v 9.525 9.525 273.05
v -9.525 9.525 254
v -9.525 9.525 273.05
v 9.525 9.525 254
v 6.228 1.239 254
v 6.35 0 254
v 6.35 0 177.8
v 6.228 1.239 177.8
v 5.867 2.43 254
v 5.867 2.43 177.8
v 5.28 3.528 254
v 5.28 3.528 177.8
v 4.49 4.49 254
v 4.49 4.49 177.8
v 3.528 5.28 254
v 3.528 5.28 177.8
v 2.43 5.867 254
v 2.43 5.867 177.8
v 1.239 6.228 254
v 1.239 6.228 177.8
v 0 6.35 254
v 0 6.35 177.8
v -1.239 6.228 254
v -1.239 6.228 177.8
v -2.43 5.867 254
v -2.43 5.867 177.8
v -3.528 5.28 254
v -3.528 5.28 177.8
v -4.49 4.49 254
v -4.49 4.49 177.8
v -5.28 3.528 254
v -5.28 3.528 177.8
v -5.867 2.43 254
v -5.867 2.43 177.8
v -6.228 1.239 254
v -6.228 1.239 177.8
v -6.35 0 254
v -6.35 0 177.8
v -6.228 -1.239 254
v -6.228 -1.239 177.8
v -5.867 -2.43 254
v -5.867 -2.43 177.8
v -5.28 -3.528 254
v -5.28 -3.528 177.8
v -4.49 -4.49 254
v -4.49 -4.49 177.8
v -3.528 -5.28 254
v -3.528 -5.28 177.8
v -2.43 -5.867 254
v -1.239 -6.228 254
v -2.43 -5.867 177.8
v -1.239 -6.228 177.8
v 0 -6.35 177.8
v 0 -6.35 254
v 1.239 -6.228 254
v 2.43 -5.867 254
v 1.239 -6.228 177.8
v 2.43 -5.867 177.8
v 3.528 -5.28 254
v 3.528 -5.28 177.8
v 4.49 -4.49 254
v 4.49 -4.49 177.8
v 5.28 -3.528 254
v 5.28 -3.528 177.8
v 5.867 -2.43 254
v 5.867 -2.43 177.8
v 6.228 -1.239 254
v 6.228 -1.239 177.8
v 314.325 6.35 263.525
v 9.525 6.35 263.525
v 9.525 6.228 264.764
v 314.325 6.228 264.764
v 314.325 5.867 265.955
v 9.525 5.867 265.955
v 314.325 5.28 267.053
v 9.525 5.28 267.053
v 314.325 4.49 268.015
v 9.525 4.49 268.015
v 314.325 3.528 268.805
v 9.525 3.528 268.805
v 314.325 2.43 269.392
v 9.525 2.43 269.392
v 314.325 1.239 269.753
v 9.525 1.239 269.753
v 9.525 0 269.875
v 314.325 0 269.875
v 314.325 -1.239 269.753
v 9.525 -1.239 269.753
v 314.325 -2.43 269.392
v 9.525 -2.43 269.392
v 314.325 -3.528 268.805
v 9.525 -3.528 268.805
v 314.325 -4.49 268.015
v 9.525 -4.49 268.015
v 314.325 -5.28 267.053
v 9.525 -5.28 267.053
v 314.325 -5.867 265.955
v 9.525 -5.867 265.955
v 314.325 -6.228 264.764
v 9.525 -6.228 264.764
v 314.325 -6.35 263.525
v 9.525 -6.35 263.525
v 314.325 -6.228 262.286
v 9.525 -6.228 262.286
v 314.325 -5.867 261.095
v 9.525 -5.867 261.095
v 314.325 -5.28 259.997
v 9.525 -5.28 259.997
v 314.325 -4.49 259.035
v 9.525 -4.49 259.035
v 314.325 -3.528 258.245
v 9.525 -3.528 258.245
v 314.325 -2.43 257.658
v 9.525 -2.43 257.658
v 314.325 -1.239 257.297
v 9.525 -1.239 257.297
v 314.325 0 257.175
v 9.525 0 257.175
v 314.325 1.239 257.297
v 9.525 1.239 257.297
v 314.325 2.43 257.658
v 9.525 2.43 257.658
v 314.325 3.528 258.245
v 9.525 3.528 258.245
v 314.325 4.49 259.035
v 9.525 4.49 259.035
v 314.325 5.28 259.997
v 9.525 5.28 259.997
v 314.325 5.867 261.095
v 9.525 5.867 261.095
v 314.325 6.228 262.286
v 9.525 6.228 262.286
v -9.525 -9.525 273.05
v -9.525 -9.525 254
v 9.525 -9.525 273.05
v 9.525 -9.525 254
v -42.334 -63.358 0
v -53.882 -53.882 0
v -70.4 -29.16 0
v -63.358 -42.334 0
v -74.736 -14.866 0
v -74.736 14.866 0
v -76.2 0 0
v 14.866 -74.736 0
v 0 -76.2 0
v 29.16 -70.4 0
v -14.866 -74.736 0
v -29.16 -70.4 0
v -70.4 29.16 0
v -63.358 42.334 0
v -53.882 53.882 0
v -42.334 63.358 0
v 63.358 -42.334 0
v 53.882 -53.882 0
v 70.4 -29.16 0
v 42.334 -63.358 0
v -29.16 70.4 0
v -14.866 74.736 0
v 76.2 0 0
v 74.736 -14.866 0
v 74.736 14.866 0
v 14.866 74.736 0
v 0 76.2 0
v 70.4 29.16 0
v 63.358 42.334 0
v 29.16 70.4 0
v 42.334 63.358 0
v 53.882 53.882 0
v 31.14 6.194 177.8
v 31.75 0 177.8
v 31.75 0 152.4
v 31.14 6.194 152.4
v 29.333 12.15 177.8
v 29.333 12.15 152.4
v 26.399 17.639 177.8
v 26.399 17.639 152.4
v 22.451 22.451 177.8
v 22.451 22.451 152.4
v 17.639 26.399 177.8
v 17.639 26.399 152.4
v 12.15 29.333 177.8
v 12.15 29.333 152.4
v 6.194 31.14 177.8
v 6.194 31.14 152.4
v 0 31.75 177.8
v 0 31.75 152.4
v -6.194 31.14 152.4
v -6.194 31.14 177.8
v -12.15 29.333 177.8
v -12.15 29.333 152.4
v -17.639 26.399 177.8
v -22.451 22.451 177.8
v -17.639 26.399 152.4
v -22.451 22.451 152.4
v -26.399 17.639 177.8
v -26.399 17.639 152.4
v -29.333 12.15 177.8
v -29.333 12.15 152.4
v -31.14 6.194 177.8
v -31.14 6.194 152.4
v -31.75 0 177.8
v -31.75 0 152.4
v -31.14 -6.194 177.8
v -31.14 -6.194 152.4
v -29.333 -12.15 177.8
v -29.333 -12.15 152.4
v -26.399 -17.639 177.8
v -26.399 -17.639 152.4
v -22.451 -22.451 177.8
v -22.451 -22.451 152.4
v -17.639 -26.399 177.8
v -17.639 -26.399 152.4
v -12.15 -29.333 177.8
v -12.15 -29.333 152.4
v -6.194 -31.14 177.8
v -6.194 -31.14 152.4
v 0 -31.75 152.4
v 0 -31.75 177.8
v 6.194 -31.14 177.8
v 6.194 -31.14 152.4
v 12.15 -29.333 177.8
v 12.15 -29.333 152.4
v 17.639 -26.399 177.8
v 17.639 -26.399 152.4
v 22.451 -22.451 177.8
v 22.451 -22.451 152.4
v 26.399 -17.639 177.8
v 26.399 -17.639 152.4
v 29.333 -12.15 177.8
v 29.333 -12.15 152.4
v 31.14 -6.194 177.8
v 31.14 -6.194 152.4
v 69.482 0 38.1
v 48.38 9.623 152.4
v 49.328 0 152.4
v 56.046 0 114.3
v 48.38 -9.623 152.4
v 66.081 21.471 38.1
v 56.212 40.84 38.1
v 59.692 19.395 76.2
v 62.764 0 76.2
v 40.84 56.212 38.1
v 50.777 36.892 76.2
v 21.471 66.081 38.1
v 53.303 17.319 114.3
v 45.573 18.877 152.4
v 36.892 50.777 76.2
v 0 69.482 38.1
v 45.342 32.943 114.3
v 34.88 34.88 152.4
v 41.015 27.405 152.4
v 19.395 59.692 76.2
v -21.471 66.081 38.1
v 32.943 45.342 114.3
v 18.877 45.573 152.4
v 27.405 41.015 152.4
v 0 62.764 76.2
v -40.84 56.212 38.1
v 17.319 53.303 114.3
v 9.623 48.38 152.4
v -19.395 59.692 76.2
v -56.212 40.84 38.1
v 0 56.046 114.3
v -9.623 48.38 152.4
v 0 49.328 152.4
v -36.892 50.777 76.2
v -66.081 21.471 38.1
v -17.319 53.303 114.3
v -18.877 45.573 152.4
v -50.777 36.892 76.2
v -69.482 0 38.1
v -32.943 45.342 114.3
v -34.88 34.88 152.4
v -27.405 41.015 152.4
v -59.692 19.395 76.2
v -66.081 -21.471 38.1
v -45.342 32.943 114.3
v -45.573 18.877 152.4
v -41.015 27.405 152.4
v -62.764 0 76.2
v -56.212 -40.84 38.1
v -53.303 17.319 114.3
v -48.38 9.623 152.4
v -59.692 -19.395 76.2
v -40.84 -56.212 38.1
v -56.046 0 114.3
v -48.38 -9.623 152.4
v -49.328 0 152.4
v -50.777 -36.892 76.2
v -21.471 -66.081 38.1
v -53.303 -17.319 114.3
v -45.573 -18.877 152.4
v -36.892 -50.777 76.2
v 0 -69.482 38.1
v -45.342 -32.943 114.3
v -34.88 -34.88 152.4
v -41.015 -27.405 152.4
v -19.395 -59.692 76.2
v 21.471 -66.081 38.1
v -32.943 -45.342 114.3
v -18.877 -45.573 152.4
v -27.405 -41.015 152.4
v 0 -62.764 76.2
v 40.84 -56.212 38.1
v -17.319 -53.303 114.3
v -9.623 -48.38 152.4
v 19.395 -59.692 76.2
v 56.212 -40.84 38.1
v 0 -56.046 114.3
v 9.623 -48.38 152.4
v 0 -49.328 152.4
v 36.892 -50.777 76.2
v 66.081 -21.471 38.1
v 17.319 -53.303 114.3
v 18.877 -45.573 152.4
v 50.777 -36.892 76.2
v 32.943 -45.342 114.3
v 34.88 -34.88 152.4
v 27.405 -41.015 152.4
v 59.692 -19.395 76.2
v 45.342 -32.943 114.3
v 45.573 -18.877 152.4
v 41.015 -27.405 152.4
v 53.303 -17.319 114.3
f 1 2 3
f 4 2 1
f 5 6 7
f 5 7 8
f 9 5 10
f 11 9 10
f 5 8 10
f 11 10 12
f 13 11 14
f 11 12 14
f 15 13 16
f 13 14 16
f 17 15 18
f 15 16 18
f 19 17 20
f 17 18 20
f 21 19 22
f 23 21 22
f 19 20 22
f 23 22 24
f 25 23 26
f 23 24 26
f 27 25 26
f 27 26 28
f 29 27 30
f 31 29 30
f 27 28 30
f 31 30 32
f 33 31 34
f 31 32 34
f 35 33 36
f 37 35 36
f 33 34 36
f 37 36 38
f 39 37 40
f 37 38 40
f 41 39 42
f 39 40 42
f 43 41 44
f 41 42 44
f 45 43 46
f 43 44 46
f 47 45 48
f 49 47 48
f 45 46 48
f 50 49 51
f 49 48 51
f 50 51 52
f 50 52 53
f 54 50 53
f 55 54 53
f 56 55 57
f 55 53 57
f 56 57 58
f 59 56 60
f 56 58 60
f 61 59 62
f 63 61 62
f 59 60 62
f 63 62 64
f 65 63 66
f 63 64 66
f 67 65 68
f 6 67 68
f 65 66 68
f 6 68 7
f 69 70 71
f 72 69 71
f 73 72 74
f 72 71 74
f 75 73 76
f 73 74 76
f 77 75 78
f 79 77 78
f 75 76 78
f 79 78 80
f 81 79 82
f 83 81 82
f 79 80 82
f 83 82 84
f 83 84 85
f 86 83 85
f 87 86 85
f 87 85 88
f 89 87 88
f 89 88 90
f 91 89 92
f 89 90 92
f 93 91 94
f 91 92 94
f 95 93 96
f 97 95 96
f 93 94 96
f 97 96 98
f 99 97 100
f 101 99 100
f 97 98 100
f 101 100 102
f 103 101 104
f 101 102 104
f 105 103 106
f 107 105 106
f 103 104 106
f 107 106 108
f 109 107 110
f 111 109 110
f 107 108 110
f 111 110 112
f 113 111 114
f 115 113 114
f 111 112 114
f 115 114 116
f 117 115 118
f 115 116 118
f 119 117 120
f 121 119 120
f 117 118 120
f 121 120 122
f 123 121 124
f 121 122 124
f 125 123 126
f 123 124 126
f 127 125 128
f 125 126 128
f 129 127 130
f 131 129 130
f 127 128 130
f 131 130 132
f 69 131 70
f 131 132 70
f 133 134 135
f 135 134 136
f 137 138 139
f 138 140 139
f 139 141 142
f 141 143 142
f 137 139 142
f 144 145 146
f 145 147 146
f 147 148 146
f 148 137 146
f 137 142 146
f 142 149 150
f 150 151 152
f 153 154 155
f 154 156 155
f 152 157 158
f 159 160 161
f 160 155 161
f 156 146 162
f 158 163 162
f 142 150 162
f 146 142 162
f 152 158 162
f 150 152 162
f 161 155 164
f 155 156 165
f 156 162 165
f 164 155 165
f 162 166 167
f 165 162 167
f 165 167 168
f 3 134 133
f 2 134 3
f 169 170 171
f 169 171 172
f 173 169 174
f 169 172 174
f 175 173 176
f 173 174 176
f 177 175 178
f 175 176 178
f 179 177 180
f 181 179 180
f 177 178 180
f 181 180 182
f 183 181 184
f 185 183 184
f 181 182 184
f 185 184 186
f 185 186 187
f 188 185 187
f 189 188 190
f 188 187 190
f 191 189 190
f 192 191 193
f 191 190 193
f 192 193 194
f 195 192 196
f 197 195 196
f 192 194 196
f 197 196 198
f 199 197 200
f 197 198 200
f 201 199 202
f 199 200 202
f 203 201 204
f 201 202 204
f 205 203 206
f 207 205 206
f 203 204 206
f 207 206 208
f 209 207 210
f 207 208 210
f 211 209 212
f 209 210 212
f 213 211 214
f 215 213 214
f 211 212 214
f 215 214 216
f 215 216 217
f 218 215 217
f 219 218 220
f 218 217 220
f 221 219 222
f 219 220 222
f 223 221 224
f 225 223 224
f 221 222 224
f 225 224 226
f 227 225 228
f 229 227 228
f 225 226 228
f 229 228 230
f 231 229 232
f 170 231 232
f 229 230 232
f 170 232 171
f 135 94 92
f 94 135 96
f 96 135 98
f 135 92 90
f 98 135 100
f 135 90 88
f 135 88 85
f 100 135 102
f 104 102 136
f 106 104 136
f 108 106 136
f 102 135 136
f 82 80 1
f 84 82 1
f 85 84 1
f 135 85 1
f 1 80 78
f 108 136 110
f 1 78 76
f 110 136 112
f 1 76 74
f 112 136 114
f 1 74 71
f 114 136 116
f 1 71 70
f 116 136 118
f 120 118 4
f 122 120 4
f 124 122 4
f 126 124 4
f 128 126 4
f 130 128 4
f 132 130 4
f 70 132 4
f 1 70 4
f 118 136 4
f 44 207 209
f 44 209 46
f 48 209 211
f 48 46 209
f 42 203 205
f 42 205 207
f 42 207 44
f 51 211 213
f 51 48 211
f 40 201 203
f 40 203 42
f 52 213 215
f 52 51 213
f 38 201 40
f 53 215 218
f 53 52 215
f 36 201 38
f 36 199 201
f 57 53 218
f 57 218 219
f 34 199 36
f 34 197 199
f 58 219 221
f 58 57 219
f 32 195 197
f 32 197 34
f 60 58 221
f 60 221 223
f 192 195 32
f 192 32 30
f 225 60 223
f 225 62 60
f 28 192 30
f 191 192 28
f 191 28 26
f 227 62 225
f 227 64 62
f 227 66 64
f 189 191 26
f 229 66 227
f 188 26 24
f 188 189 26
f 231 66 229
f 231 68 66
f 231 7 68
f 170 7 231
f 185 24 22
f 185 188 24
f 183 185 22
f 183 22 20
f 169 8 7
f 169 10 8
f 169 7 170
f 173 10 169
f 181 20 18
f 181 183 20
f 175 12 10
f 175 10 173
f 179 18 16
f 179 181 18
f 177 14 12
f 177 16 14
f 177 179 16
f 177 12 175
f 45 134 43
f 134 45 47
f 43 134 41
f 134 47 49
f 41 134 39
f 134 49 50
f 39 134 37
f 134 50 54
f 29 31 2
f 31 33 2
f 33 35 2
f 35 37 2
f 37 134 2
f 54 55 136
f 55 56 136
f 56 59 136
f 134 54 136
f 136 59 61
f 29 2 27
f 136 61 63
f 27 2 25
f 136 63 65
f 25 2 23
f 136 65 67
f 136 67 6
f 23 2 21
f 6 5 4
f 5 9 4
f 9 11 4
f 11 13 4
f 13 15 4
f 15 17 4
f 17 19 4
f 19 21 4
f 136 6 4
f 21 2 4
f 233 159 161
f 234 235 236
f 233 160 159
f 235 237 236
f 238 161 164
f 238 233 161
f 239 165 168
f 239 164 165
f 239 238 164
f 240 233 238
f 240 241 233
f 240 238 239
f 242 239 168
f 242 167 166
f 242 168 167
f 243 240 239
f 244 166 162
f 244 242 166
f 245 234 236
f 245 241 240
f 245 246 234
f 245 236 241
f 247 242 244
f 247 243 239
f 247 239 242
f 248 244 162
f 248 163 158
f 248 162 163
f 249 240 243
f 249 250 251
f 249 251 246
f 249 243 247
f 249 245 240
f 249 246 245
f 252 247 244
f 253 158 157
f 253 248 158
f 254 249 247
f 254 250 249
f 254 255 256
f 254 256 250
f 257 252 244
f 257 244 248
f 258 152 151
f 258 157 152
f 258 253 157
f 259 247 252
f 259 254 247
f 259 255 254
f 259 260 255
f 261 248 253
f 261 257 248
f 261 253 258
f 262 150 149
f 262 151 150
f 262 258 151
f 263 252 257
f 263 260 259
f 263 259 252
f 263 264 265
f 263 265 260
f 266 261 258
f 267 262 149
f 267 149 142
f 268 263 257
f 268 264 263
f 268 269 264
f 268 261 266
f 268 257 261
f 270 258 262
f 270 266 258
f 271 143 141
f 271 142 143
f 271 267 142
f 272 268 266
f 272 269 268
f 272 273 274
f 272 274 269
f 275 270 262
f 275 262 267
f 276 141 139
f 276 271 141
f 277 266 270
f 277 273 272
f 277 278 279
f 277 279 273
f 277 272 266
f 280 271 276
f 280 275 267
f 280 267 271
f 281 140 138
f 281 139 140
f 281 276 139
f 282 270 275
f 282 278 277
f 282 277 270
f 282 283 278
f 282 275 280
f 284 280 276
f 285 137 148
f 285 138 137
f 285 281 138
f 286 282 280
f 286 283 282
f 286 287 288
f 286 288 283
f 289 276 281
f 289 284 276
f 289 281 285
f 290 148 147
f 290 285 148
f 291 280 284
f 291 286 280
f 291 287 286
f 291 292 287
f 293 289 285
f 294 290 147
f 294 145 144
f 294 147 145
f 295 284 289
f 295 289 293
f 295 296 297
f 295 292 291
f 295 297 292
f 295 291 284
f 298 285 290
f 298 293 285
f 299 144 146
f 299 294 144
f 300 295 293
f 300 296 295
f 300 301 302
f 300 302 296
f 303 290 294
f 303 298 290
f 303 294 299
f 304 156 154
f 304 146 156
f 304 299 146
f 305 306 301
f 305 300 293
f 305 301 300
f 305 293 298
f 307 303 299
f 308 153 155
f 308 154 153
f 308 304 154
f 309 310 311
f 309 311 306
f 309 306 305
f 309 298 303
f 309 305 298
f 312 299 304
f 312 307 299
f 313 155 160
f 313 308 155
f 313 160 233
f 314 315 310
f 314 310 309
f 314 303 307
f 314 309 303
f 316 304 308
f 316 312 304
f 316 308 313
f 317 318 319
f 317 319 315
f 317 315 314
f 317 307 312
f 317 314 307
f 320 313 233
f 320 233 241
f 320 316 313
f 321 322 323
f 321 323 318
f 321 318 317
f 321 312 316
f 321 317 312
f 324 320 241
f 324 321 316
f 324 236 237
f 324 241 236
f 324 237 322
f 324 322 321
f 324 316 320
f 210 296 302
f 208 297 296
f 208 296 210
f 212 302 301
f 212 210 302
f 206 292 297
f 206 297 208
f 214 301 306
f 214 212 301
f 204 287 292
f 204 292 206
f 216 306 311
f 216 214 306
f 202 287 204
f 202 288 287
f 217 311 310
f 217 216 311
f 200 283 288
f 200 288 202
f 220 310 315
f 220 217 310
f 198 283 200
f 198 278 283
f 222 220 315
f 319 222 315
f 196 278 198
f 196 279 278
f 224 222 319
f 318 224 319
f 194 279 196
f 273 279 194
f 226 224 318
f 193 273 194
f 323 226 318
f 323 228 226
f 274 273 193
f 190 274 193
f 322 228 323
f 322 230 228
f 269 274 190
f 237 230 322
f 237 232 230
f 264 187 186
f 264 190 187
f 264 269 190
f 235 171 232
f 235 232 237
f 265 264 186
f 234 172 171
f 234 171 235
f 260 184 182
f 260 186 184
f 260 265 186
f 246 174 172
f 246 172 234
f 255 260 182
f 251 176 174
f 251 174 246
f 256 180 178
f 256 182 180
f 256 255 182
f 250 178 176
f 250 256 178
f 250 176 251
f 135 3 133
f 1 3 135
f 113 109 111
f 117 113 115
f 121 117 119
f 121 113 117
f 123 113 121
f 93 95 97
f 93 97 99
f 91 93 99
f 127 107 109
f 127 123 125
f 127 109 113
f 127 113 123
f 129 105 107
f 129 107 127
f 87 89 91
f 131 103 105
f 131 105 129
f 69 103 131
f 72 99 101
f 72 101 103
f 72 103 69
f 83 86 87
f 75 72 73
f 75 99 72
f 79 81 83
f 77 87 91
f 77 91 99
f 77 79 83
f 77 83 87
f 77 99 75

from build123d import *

# Parameters (mm, degrees)
F0_R     = 76.2
F1_DEPTH = 152.4
F1_TAPER = 10
F2_R     = 31.75
F3_DEPTH = 25.4
F4_R     = 6.35
F5_DEPTH = 76.2
F6_W     = 19.05
F6_H     = 19.05
F6_R     = 6.35
F7_DEPTH = 19.05
F8_R     = 6.35
F9_DEPTH = 304.8


with BuildPart() as f1:
    # F0 (on Top) → F1 (new body)
    with BuildSketch(Plane.XY):
        Circle(F0_R)
    extrude(amount=F1_DEPTH, taper=F1_TAPER)

    # F2 (on face) → F3 (join)
    with BuildSketch(Plane.XY.offset(152.4)):
        Circle(F2_R)
    extrude(amount=F3_DEPTH)

    # F4 (on face) → F5 (join)
    with BuildSketch(Plane.XY.offset(177.8)):
        Circle(F4_R)
    extrude(amount=F5_DEPTH)

    # F6 (on face) → F7 (join)
    with BuildSketch(Plane.XY.offset(254)):
        Rectangle(F6_W, F6_H)
        Circle(F6_R, mode=Mode.SUBTRACT)
        Circle(F6_R)
    extrude(amount=F7_DEPTH)

    # F8 (on face) → F9 (join)
    with BuildSketch(Plane.YZ.offset(9.525)):
        with Locations((0, 263.525)):
            Circle(F8_R)
    extrude(amount=F9_DEPTH)


solid = f1.part
